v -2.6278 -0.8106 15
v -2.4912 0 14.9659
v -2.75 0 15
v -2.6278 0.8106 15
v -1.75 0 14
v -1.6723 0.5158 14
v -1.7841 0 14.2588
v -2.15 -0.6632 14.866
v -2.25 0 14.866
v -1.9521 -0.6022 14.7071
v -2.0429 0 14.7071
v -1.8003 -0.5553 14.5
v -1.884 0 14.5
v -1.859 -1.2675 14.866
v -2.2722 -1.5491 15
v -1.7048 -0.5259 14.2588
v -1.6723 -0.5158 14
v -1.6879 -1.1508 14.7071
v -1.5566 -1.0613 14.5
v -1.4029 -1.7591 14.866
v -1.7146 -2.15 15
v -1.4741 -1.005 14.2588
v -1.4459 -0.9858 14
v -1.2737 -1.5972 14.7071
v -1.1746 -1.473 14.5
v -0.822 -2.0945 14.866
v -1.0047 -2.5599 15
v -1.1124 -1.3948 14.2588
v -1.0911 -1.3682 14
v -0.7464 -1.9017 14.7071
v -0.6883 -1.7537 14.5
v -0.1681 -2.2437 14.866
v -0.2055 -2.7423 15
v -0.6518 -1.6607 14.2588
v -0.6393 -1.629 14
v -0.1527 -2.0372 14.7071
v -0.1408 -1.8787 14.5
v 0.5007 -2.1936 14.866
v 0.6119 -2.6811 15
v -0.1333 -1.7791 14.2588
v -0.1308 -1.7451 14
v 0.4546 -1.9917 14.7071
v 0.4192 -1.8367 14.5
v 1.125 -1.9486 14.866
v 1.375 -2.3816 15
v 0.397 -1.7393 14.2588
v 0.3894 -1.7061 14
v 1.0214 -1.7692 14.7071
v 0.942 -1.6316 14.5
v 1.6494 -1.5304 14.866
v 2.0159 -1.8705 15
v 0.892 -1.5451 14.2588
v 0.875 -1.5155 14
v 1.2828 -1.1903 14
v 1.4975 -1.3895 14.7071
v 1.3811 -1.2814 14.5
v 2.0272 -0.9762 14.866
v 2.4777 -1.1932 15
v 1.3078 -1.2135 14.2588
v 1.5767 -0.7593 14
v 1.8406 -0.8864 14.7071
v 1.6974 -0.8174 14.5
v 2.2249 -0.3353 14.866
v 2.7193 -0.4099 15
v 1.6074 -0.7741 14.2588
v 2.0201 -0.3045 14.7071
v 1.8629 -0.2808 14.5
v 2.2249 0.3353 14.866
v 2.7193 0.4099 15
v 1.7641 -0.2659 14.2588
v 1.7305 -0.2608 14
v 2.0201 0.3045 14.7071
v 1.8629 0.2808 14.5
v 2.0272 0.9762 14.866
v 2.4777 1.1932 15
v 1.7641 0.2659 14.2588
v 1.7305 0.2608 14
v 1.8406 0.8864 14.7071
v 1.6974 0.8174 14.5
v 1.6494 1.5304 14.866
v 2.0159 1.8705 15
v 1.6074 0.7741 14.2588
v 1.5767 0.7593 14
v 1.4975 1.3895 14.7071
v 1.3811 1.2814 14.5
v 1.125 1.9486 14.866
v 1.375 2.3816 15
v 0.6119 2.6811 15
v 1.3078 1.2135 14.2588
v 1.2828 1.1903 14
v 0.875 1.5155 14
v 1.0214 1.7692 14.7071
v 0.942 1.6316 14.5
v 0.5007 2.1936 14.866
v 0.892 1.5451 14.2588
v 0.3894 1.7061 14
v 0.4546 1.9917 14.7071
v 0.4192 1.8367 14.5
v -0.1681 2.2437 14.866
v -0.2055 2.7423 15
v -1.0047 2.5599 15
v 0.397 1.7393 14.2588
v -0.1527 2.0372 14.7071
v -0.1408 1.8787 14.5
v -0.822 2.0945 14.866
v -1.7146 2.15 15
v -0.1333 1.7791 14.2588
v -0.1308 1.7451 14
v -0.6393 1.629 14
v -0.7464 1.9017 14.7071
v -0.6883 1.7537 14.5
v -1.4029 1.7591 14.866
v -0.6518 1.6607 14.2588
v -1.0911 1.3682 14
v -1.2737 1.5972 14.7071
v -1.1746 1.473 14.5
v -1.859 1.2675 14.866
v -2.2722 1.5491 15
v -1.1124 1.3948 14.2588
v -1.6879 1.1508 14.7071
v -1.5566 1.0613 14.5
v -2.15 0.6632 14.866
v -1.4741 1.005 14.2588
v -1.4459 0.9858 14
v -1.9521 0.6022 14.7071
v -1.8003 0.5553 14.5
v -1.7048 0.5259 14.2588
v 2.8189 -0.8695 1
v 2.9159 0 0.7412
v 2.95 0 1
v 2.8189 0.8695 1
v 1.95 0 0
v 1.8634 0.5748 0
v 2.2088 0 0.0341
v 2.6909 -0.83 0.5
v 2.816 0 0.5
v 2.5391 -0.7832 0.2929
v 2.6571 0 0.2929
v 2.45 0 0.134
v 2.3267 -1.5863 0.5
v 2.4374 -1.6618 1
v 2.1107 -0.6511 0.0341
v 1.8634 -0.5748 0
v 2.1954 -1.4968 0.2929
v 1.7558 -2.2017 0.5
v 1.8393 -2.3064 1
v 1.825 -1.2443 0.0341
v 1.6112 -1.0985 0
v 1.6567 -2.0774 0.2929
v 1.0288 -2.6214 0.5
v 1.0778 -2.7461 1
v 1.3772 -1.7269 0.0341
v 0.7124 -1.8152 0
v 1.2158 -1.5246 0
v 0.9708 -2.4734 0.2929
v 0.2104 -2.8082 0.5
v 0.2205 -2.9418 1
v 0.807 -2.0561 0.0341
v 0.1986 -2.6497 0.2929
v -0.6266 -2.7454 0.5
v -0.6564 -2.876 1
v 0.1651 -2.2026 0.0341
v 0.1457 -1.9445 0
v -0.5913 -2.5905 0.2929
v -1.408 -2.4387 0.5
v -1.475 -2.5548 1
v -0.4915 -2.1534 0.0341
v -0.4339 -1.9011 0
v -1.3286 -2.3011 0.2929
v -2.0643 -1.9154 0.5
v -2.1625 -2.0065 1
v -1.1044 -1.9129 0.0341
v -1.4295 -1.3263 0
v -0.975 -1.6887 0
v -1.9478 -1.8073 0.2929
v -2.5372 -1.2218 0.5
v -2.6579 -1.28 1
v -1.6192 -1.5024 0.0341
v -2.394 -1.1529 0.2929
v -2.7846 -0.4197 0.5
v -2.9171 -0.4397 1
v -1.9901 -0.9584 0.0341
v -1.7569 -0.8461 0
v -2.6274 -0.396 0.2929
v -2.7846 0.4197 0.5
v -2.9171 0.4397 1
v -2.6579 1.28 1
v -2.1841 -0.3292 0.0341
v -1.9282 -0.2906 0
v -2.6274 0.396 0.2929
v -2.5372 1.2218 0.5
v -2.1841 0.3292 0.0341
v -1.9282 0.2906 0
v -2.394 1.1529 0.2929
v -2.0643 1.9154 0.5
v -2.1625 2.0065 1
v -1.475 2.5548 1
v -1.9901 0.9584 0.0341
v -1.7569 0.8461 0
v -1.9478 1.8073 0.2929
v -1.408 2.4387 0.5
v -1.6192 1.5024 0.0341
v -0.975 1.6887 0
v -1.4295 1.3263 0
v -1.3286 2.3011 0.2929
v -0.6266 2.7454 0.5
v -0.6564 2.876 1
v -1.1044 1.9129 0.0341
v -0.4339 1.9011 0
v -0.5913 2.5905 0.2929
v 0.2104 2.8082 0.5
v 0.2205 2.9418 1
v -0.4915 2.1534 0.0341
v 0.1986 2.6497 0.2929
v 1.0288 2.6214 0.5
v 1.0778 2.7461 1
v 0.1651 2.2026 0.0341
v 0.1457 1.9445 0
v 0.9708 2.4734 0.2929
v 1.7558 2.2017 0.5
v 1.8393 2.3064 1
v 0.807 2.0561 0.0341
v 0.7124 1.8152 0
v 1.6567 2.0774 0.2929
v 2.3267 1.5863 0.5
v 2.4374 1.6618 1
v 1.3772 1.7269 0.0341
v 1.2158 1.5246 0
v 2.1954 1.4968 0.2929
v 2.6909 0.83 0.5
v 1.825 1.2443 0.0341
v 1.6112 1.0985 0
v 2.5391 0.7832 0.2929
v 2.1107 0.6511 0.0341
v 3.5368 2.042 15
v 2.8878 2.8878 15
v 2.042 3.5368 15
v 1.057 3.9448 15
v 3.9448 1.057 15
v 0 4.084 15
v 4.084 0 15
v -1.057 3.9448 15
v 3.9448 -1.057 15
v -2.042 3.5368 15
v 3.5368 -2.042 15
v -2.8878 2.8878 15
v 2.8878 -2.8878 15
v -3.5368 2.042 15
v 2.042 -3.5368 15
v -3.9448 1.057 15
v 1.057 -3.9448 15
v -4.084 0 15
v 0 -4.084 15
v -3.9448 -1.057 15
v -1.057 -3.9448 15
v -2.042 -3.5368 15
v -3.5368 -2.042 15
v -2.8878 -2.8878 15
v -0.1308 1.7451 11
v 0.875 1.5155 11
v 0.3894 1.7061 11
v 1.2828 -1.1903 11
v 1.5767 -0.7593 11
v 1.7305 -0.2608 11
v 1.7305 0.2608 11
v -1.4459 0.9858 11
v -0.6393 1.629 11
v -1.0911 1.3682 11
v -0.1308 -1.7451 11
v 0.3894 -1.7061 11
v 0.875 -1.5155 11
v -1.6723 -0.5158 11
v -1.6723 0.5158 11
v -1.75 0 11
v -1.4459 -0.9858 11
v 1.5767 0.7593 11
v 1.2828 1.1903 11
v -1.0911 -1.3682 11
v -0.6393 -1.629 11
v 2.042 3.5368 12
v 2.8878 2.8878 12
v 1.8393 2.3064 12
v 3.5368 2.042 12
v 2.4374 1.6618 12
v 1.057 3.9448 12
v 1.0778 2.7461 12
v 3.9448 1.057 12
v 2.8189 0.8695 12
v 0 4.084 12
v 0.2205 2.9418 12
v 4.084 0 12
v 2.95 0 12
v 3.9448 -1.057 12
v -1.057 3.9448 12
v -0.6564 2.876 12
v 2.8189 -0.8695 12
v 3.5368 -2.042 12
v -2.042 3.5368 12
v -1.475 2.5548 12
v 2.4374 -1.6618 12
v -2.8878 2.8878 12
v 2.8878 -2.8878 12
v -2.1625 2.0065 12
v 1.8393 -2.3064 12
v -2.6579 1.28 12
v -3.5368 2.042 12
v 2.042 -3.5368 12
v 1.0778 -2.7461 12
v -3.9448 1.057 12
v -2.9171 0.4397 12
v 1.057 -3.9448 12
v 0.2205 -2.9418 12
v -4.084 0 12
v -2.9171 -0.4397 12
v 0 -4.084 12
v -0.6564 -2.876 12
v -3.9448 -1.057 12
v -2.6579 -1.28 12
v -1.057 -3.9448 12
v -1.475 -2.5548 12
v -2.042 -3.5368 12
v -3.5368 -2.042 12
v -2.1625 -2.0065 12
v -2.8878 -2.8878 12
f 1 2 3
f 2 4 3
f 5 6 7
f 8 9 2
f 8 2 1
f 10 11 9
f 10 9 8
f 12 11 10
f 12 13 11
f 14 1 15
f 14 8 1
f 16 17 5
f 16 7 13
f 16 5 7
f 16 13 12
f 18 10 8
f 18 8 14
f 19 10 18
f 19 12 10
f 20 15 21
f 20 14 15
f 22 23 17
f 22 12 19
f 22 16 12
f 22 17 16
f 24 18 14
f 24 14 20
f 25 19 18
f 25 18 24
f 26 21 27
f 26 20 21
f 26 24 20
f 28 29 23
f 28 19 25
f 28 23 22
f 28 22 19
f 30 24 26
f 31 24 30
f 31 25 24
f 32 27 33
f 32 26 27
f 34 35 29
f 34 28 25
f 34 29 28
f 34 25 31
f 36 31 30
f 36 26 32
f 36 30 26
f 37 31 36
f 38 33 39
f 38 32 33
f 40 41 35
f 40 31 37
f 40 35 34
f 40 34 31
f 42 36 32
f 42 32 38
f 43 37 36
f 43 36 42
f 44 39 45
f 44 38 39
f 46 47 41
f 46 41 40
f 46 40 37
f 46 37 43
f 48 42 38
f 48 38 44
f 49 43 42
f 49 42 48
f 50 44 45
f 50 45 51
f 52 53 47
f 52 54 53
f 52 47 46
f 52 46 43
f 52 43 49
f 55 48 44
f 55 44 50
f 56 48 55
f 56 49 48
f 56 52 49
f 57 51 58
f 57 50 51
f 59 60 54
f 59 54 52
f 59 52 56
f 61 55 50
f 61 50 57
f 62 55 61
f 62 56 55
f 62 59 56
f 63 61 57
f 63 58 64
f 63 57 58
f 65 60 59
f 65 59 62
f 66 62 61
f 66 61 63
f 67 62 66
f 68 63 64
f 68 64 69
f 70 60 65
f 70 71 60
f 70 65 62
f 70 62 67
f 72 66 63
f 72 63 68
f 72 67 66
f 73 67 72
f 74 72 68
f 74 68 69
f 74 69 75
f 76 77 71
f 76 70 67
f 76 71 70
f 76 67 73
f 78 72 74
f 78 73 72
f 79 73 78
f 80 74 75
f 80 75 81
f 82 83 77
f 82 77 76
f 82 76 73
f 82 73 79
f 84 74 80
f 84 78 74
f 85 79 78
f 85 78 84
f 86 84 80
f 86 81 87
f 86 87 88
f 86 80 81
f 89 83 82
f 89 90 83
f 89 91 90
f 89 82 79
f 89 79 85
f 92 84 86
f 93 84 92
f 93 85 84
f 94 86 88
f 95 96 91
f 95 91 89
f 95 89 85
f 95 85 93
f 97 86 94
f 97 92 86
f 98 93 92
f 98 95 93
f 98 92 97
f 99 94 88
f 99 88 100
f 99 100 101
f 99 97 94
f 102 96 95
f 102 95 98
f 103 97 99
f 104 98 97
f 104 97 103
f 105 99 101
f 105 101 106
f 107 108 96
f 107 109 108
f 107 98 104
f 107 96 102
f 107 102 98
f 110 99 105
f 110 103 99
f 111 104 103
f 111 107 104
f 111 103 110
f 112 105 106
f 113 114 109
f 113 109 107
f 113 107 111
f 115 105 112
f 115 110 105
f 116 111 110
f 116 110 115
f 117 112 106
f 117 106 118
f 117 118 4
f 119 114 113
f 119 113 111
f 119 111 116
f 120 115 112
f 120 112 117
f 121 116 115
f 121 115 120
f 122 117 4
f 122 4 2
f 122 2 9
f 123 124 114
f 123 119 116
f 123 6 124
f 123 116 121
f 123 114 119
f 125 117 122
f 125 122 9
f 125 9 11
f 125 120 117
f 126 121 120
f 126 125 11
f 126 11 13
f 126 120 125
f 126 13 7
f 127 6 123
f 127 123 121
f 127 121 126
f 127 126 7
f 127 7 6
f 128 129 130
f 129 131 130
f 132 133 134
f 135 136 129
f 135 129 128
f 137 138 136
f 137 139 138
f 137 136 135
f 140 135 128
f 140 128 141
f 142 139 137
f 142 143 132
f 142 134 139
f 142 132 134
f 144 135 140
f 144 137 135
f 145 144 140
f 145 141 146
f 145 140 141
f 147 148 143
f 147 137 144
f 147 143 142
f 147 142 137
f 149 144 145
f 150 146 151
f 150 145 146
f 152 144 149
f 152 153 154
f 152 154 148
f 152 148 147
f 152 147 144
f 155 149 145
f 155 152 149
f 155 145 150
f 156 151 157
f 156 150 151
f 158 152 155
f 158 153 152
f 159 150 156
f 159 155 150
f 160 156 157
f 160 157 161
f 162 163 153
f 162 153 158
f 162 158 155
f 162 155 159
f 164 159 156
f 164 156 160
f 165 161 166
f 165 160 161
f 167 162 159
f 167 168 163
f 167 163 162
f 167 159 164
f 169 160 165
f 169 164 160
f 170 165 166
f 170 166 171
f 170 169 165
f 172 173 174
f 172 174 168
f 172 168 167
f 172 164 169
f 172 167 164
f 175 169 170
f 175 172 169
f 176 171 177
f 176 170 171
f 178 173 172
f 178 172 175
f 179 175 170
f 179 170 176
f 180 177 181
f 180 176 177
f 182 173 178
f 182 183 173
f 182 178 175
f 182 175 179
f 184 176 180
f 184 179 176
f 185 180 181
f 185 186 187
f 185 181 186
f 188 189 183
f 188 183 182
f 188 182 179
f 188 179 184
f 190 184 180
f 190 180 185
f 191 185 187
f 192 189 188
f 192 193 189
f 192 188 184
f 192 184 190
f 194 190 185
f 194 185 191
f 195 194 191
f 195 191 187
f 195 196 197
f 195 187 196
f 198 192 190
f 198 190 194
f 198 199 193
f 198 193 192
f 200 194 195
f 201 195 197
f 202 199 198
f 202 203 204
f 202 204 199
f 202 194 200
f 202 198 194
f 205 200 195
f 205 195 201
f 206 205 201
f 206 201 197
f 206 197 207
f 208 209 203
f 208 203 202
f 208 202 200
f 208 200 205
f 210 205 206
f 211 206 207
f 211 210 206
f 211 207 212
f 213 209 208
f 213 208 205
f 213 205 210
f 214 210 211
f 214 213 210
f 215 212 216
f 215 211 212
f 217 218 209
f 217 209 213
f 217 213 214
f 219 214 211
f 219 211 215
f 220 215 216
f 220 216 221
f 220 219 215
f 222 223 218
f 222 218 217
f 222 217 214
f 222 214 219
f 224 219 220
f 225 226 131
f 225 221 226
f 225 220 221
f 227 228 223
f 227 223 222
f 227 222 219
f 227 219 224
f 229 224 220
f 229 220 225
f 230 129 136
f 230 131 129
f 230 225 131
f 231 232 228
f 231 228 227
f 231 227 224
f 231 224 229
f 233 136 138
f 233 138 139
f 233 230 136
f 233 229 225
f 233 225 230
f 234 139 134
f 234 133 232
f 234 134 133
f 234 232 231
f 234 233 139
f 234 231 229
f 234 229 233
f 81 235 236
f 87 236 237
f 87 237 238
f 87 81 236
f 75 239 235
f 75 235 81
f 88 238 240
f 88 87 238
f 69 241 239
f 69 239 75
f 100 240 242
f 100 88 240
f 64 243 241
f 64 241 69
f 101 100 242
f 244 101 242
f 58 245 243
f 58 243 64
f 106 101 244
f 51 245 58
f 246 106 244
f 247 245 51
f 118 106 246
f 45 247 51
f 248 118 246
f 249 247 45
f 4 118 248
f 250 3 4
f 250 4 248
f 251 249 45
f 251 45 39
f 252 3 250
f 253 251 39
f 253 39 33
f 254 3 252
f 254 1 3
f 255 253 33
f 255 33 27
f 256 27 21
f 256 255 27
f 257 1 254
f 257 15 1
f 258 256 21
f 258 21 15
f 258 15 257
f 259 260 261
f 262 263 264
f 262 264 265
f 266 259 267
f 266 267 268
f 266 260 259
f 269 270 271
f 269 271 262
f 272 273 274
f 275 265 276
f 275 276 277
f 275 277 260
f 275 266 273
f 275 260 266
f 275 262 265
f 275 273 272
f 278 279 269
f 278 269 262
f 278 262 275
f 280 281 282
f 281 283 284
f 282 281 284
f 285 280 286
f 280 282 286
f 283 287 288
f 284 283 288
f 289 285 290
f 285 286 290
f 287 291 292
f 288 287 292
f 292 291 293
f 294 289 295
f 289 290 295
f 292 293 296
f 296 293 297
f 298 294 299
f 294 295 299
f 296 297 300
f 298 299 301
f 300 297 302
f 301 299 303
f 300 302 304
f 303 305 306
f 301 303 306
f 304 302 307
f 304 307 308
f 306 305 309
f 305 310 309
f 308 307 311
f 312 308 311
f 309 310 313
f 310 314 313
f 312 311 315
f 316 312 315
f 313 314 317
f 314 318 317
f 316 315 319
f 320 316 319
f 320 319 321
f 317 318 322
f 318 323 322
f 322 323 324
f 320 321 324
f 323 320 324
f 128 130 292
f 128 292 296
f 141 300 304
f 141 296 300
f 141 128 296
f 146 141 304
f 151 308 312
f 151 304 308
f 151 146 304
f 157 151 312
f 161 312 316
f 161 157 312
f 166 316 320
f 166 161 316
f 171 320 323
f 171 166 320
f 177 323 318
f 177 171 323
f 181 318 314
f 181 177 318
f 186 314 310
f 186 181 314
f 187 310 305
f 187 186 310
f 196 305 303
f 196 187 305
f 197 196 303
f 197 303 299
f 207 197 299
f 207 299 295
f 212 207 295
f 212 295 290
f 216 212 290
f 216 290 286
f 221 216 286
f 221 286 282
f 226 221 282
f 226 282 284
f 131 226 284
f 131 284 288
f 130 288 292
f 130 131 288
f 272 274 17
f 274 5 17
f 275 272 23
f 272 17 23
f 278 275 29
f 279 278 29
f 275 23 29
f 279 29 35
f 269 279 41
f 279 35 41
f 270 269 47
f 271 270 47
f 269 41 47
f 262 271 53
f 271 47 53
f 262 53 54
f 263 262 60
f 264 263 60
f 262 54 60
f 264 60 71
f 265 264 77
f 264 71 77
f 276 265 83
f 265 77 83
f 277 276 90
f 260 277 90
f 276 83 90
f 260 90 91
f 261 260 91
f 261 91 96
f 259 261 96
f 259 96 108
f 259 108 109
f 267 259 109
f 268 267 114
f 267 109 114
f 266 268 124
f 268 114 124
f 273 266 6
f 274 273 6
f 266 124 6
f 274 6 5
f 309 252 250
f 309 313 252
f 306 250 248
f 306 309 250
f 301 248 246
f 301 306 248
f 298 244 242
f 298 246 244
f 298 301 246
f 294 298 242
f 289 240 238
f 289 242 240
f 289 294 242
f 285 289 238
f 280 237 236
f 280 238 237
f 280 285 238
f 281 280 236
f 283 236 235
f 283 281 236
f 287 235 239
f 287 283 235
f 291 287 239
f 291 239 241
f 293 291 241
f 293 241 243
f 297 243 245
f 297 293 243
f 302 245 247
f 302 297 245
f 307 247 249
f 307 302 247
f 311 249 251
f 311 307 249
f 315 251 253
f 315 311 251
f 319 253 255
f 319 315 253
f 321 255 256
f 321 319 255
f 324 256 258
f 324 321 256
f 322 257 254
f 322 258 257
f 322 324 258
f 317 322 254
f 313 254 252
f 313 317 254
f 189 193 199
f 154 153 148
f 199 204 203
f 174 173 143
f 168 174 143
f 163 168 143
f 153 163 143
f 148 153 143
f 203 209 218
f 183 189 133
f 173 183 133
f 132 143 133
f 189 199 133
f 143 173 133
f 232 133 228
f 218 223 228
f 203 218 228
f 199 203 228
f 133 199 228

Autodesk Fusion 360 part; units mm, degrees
sketch "Sketch1" plane through (0, 0, 0) normal (0, 0, 1) x (1, 0, 0)
  circle A0 centre (0, 0) radius 2.95
  dimension "d1" = 5.9
extrude "Extrude1" add sketch "Sketch1" along normal blind 12
sketch "Sketch2" plane through (0, 0, 12) normal (0, 0, 1) x (-1, 0, 0)
  circle A0 centre (0, 0) radius 2.95
  circle A1 centre (0, 0) radius 4.084
extrude "Extrude2" add sketch "Sketch2" along normal blind 3 contours A0 | A1
sketch "Sketch3" plane through (0, 0, 15) normal (0, 0, 1) x (-1, 0, 0)
  circle A0 centre (0, 0) radius 4.084
  circle A1 centre (0, 0) radius 1.75
  dimension "d6" = 3.5
extrude "Extrude3" cut sketch "Sketch3" against normal blind 4 contours A1
fillet "Fillet1" radius 1 1 edges at (-2.7504, -1.0668, 0)
fillet "Fillet2" radius 1 1 edges at (1.6316, -0.6328, 15)
